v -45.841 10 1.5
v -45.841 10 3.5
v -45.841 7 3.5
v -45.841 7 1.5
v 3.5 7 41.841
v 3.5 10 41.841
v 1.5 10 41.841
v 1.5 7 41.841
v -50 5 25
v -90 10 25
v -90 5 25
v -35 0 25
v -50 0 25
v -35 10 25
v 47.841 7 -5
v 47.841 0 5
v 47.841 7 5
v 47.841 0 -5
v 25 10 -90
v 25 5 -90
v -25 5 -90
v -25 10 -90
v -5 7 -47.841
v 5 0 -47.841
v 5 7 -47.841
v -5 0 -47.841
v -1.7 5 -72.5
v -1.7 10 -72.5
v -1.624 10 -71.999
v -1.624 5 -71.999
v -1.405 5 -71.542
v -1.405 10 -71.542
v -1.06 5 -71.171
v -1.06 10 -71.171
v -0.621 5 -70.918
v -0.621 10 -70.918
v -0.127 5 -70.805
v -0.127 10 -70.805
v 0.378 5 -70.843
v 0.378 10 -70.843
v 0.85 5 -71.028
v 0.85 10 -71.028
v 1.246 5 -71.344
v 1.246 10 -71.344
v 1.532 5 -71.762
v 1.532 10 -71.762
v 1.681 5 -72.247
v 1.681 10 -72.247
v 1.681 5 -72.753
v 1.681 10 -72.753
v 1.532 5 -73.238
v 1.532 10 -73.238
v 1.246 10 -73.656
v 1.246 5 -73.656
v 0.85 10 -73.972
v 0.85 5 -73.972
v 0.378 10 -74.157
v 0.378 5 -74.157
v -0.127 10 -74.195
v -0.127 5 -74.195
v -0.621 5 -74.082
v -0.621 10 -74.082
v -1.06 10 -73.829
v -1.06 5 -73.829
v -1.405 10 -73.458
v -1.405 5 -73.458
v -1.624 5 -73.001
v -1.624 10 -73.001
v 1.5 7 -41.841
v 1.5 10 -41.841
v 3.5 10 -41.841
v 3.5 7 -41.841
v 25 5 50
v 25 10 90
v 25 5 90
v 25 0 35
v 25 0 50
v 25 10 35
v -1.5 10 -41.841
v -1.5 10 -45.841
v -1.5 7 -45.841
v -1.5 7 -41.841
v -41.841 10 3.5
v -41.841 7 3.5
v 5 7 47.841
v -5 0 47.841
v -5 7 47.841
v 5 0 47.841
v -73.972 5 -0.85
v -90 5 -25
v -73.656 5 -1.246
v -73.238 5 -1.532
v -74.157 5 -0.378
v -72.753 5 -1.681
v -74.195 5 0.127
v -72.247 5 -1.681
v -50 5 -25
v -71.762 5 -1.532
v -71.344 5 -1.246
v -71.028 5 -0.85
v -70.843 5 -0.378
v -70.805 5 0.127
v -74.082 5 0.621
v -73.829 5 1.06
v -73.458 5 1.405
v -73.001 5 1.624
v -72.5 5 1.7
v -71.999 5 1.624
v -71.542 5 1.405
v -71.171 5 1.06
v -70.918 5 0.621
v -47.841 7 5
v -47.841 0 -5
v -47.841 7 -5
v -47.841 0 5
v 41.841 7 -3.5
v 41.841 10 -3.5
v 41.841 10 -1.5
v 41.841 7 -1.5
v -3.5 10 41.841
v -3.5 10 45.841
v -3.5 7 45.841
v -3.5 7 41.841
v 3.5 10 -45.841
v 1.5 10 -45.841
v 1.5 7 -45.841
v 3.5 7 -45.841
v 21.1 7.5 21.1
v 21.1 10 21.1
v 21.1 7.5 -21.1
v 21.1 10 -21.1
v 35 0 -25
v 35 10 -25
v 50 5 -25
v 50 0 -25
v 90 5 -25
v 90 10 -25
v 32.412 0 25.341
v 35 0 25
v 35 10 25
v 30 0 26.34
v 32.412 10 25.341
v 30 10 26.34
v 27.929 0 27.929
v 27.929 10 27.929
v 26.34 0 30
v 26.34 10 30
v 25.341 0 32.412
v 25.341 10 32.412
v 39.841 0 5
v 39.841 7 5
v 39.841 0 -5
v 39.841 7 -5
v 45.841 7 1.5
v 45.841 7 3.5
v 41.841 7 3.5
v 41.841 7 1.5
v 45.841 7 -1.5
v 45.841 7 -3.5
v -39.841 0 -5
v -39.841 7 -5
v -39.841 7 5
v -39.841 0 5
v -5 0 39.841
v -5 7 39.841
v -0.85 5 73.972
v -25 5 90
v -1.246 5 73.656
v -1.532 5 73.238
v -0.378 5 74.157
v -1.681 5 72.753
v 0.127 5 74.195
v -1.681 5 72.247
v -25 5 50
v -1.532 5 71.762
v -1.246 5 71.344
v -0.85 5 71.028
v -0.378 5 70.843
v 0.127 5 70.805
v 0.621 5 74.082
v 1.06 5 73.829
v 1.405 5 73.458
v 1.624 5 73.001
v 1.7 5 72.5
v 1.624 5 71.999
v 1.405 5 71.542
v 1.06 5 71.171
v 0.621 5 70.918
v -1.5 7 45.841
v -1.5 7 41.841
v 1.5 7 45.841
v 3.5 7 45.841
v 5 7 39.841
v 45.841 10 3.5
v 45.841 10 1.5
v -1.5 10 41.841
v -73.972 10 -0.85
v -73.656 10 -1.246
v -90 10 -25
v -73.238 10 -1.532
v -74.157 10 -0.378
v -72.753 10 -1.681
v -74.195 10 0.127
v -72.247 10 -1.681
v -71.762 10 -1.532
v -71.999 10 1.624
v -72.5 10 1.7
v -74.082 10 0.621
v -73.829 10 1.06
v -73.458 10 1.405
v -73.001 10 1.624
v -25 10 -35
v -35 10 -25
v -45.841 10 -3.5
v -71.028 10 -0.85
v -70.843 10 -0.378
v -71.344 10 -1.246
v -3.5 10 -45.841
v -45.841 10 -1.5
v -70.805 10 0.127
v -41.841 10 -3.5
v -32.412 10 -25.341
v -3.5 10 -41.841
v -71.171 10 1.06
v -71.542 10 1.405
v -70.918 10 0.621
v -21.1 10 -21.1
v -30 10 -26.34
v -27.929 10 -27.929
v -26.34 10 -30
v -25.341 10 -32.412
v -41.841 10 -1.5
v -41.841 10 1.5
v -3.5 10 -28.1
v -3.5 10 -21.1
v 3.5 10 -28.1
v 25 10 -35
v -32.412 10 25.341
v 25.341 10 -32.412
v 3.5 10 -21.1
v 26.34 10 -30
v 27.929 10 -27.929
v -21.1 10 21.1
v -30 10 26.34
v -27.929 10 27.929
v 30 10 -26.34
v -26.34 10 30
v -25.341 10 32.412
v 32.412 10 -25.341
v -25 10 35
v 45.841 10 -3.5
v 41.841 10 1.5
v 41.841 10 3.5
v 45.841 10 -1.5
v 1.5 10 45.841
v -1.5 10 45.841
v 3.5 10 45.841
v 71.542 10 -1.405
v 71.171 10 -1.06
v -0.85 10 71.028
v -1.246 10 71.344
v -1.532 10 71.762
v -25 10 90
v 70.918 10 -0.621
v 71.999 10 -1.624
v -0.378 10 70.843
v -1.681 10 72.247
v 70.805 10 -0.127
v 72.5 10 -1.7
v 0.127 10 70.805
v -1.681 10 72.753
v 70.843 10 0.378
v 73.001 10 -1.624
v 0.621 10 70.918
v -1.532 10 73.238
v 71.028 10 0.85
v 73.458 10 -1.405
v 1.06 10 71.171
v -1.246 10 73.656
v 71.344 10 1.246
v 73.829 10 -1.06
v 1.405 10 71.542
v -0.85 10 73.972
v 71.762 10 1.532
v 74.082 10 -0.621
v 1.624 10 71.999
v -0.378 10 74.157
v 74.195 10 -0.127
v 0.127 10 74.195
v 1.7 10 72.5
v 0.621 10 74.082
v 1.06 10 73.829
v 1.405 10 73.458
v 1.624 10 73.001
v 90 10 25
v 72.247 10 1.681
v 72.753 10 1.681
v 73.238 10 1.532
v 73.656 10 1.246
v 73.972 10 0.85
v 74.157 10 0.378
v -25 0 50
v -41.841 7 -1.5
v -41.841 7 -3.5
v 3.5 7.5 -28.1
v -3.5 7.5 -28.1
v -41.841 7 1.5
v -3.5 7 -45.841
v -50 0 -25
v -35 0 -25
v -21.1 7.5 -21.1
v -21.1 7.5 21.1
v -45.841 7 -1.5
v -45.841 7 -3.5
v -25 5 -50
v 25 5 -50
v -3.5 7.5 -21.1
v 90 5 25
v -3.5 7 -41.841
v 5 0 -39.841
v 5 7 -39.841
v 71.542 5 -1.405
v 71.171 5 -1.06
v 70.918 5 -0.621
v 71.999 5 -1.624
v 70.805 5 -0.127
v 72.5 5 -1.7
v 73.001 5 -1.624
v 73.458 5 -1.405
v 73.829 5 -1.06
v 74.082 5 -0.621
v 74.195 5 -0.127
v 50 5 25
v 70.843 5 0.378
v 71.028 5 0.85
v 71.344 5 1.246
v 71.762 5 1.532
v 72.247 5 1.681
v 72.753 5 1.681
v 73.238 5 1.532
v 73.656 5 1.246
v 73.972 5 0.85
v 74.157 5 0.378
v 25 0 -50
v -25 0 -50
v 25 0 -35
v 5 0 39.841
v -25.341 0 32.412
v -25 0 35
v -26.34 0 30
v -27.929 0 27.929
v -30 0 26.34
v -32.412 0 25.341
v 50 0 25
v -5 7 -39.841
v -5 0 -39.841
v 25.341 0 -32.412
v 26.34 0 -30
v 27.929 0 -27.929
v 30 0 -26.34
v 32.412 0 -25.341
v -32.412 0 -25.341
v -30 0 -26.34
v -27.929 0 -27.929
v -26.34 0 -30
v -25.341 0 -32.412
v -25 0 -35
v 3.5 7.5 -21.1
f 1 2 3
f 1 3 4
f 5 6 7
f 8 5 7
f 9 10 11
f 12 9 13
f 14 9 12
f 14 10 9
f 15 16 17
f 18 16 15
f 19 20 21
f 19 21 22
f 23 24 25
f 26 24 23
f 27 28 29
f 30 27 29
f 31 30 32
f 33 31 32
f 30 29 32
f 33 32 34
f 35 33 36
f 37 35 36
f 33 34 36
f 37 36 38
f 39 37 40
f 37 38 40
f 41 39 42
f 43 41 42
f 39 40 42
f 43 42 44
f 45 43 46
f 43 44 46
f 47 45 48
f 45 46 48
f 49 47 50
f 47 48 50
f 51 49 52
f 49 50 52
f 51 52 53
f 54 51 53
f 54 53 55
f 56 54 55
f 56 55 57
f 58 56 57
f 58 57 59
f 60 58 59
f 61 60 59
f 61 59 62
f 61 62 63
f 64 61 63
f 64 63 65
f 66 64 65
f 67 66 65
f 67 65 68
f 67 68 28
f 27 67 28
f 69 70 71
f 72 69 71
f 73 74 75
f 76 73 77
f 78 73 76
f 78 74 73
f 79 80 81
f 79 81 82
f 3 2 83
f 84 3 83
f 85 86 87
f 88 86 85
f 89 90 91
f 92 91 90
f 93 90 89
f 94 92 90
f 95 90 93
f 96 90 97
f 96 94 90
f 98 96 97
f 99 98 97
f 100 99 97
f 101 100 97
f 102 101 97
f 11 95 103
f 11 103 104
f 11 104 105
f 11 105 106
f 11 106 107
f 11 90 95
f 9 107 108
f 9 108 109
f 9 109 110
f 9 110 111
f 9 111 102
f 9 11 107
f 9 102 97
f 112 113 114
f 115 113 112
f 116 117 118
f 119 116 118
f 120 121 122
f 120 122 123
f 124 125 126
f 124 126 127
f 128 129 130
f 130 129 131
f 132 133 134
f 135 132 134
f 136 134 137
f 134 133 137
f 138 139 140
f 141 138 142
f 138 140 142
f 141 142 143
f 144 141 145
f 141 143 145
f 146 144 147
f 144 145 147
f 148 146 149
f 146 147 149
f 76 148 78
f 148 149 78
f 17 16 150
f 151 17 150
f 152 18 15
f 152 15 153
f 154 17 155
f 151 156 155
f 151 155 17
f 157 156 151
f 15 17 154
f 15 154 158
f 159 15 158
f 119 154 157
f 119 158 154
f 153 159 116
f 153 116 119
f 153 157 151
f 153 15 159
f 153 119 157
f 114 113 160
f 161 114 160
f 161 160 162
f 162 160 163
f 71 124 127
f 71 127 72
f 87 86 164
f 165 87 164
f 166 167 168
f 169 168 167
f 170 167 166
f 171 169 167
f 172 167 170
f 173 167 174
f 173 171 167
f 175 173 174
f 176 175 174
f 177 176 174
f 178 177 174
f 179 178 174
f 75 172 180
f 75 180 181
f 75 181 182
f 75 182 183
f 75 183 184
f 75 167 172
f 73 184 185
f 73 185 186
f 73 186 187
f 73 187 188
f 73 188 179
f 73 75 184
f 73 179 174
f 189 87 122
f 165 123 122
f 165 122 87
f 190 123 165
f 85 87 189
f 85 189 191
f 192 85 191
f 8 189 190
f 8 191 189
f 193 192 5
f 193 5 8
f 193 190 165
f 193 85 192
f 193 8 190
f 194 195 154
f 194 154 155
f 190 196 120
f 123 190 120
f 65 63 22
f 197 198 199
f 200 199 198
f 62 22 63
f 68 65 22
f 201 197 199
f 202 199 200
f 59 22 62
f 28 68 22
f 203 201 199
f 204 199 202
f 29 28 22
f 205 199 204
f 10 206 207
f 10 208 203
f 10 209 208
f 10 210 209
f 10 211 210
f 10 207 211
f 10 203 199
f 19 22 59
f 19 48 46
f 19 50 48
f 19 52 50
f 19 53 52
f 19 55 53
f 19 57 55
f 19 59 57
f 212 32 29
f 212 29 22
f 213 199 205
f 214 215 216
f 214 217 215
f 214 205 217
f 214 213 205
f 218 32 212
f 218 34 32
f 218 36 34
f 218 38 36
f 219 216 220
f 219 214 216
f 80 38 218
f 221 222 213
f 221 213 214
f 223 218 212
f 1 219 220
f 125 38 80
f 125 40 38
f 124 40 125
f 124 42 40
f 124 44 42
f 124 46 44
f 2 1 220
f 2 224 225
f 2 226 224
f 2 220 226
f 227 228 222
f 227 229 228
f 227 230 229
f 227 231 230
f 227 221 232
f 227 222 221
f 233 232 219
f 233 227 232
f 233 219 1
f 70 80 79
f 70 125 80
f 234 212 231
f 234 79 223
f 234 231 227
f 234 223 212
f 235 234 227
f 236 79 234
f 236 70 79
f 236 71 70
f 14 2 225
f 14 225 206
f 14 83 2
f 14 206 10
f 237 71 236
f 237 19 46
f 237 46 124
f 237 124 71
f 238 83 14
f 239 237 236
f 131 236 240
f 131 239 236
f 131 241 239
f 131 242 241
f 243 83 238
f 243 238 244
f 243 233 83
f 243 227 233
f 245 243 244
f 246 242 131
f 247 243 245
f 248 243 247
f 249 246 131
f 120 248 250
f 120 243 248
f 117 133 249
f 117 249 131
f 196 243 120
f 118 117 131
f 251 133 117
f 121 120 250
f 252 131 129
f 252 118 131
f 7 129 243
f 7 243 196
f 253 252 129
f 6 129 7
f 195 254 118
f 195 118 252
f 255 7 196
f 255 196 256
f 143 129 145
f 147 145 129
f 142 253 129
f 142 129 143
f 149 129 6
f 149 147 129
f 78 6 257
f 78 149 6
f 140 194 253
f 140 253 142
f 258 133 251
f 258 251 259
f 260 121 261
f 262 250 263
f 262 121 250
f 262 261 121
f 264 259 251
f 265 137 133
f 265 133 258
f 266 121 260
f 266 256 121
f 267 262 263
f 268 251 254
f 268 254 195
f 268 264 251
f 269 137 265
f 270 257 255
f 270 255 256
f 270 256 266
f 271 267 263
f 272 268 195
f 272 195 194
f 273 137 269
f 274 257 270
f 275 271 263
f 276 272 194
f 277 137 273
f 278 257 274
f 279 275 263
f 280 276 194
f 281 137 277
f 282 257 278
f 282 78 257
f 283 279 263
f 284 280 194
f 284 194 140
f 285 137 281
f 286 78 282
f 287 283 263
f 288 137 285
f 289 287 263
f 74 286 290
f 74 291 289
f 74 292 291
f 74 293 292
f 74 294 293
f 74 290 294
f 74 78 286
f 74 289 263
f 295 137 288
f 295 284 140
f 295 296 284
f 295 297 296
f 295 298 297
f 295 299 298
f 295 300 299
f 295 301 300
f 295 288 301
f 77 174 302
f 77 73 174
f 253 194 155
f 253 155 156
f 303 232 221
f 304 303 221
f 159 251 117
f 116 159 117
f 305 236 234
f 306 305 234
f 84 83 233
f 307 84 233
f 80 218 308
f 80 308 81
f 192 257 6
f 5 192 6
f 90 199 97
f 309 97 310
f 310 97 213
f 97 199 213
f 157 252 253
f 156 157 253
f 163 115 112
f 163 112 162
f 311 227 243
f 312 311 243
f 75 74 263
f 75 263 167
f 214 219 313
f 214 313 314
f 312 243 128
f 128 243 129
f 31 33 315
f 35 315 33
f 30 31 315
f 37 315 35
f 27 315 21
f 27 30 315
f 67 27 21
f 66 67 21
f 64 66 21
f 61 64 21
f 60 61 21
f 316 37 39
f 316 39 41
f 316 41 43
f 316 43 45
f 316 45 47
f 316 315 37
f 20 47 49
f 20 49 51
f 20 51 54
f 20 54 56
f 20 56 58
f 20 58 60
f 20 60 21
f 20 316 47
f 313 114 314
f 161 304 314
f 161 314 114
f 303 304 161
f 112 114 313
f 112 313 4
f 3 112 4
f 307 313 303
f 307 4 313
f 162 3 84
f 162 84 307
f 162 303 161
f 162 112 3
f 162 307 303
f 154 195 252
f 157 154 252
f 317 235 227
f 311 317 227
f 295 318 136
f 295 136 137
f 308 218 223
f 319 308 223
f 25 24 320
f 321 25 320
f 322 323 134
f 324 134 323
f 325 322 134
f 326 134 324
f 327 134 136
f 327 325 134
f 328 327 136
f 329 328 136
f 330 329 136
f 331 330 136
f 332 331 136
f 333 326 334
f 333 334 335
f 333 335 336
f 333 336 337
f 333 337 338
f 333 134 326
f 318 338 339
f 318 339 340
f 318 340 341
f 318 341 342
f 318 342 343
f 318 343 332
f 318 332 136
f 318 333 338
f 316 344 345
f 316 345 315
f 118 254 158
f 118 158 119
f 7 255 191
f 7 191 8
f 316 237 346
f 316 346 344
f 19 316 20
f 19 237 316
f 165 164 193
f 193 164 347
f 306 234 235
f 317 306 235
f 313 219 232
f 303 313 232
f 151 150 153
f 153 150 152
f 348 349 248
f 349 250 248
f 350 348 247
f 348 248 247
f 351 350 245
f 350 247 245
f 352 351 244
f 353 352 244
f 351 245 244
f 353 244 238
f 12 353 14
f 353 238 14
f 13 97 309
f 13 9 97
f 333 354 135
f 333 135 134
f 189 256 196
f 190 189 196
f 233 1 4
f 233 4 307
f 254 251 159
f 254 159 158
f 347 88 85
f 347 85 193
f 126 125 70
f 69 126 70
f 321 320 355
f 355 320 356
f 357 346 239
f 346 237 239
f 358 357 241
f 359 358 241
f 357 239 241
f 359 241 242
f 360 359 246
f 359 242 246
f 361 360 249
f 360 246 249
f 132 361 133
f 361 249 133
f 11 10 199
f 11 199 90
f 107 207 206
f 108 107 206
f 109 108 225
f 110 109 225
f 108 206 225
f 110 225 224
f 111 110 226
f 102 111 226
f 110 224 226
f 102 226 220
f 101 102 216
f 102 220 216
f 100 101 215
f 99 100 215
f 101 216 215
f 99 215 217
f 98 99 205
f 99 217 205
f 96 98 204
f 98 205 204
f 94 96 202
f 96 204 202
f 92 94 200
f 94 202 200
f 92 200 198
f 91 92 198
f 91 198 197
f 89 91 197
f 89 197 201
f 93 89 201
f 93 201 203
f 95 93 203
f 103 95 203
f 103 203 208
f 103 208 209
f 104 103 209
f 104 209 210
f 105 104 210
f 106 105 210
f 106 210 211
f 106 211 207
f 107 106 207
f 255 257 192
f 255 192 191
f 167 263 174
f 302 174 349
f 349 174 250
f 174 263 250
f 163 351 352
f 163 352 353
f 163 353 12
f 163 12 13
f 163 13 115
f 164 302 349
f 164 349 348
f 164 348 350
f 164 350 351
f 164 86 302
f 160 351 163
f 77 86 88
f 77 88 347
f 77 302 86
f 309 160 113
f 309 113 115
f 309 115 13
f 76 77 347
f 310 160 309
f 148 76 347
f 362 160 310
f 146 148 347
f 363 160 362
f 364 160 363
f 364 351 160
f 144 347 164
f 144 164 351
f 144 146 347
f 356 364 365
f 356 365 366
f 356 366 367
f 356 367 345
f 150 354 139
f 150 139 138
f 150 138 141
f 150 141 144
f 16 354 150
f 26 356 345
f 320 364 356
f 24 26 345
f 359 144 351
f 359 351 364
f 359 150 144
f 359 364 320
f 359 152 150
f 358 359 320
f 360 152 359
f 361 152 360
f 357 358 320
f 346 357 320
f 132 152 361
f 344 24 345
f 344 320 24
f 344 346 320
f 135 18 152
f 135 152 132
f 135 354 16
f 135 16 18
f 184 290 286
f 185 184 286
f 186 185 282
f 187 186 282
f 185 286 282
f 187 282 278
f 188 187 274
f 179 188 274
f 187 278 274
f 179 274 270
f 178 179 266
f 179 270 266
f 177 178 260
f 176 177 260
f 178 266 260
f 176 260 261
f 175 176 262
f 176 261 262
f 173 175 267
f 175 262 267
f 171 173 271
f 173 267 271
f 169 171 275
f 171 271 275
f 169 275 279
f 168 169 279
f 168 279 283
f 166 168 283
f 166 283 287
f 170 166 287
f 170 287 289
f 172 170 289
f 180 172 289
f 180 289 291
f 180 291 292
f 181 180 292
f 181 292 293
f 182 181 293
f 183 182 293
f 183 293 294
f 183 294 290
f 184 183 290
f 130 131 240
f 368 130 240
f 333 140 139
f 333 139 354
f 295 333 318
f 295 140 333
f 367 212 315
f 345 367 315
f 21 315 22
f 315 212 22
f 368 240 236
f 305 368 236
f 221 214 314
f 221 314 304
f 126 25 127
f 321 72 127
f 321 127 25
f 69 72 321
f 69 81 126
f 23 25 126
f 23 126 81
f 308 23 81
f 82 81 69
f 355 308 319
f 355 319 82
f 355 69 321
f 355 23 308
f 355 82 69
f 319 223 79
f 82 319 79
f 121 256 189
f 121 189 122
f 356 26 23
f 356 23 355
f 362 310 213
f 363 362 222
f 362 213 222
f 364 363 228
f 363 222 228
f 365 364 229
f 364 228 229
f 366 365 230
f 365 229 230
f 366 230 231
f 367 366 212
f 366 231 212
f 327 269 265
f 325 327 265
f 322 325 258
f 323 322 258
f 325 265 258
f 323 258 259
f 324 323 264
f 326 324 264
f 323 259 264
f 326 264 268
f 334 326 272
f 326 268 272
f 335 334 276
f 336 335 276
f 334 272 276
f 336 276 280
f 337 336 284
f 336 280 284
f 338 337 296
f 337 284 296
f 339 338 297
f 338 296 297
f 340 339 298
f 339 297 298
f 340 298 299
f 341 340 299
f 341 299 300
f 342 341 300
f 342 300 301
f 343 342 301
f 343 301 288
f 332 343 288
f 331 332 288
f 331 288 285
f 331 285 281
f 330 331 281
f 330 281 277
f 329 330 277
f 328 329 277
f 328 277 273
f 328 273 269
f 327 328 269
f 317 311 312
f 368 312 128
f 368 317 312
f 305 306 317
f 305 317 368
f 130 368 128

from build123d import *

# Parameters (mm, degrees)
BOSS_EXTRUDE2_DEPTH = 25
CIRPATTERN2_COUNT   = 4
CUT_EXTRUDE2_DEPTH  = 2.5
FILLET1_R           = 10
SKETCH8_R           = 1.7
CUT_EXTRUDE3_DEPTH  = 128.671453348
CIRPATTERN3_COUNT   = 4
SKETCH10_W          = 4
SKETCH10_H          = 2
CUT_EXTRUDE4_DEPTH  = 128.671453348
SKETCH11_W          = 8
SKETCH11_H          = 10
CUT_EXTRUDE5_DEPTH  = 7
CIRPATTERN4_COUNT   = 4


with BuildPart() as part:
    # Sketch2 → Boss-Extrude2 (new, symmetric)
    with BuildSketch(Plane.XY):
        Polygon((-50, 0), (50, 0), (50, 5), (90, 5), (90, 10), (-90, 10), (-90, 5), (-50, 5), align=None)
    boss_extrude2 = extrude(amount=BOSS_EXTRUDE2_DEPTH, both=True)

    # CirPattern2: Boss-Extrude2 ×4 about axis
    cirpattern2_axis = Axis((0, 0, 0), (0, 1, 0))
    for i in range(1, CIRPATTERN2_COUNT):
        add(boss_extrude2.rotate(cirpattern2_axis, i * 360 / CIRPATTERN2_COUNT))

    # Sketch4 → Cut-Extrude2 (cut, symmetric)
    with BuildSketch(Plane(origin=(0, 10, 0), x_dir=(1, 0, 0), z_dir=(0, 1, 0))):
        Polygon((-3.5, 21.1), (-21.1, 21.1), (-21.1, -21.1), (21.1, -21.1), (21.1, 21.1), (3.5, 21.1), (3.5, 28.1), (-3.5, 28.1), align=None)
    extrude(amount=CUT_EXTRUDE2_DEPTH, both=True, mode=Mode.SUBTRACT)

    # Fillet1
    fillet1_edges = [part.edges().sort_by_distance(p)[0] for p in [
        (-25, 5, 25),
        (25, 5, -25),
        (25, 5, 25),
        (-25, 5, -25),
    ]]
    fillet(fillet1_edges, radius=FILLET1_R)

    # Sketch8 → Cut-Extrude3 (cut, through all)
    with BuildSketch(Plane(origin=(0, 10, 0), x_dir=(1, 0, 0), z_dir=(0, 1, 0))):
        with Locations(Location((-72.5, 0, 0), (0, 0, 270))):
            Circle(SKETCH8_R)
    cut_extrude3 = extrude(amount=-CUT_EXTRUDE3_DEPTH, mode=Mode.SUBTRACT)

    # CirPattern3: Cut-Extrude3 ×4 about axis
    cirpattern3_axis = Axis((0, 0, 0), (0, 1, 0))
    for i in range(1, CIRPATTERN3_COUNT):
        add(cut_extrude3.rotate(cirpattern3_axis, i * 360 / CIRPATTERN3_COUNT), mode=Mode.SUBTRACT)

    # Sketch10 → Cut-Extrude4 (cut, through all)
    with BuildSketch(Plane(origin=(0, 10, 0), x_dir=(1, 0, 0), z_dir=(0, 1, 0))):
        with Locations((-43.840620434, 2.5)):
            Rectangle(SKETCH10_W, SKETCH10_H)
        with Locations((-43.840620434, -2.5)):
            Rectangle(SKETCH10_W, SKETCH10_H)
    cut_extrude4 = extrude(amount=-CUT_EXTRUDE4_DEPTH, mode=Mode.SUBTRACT)

    # Sketch11 → Cut-Extrude5 (cut)
    with BuildSketch(Plane.XZ):
        with Locations((-43.840620434, 0)):
            Rectangle(SKETCH11_W, SKETCH11_H)
    cut_extrude5 = extrude(amount=-CUT_EXTRUDE5_DEPTH, mode=Mode.SUBTRACT)

    # CirPattern4: Cut-Extrude4, Cut-Extrude5 ×4 about axis
    cirpattern4_axis = Axis((0, 0, 0), (0, 1, 0))
    add([cut_extrude4.rotate(cirpattern4_axis, i * 360 / CIRPATTERN4_COUNT) for i in range(1, CIRPATTERN4_COUNT)], mode=Mode.SUBTRACT)
    add([cut_extrude5.rotate(cirpattern4_axis, i * 360 / CIRPATTERN4_COUNT) for i in range(1, CIRPATTERN4_COUNT)], mode=Mode.SUBTRACT)


solid = part.part
